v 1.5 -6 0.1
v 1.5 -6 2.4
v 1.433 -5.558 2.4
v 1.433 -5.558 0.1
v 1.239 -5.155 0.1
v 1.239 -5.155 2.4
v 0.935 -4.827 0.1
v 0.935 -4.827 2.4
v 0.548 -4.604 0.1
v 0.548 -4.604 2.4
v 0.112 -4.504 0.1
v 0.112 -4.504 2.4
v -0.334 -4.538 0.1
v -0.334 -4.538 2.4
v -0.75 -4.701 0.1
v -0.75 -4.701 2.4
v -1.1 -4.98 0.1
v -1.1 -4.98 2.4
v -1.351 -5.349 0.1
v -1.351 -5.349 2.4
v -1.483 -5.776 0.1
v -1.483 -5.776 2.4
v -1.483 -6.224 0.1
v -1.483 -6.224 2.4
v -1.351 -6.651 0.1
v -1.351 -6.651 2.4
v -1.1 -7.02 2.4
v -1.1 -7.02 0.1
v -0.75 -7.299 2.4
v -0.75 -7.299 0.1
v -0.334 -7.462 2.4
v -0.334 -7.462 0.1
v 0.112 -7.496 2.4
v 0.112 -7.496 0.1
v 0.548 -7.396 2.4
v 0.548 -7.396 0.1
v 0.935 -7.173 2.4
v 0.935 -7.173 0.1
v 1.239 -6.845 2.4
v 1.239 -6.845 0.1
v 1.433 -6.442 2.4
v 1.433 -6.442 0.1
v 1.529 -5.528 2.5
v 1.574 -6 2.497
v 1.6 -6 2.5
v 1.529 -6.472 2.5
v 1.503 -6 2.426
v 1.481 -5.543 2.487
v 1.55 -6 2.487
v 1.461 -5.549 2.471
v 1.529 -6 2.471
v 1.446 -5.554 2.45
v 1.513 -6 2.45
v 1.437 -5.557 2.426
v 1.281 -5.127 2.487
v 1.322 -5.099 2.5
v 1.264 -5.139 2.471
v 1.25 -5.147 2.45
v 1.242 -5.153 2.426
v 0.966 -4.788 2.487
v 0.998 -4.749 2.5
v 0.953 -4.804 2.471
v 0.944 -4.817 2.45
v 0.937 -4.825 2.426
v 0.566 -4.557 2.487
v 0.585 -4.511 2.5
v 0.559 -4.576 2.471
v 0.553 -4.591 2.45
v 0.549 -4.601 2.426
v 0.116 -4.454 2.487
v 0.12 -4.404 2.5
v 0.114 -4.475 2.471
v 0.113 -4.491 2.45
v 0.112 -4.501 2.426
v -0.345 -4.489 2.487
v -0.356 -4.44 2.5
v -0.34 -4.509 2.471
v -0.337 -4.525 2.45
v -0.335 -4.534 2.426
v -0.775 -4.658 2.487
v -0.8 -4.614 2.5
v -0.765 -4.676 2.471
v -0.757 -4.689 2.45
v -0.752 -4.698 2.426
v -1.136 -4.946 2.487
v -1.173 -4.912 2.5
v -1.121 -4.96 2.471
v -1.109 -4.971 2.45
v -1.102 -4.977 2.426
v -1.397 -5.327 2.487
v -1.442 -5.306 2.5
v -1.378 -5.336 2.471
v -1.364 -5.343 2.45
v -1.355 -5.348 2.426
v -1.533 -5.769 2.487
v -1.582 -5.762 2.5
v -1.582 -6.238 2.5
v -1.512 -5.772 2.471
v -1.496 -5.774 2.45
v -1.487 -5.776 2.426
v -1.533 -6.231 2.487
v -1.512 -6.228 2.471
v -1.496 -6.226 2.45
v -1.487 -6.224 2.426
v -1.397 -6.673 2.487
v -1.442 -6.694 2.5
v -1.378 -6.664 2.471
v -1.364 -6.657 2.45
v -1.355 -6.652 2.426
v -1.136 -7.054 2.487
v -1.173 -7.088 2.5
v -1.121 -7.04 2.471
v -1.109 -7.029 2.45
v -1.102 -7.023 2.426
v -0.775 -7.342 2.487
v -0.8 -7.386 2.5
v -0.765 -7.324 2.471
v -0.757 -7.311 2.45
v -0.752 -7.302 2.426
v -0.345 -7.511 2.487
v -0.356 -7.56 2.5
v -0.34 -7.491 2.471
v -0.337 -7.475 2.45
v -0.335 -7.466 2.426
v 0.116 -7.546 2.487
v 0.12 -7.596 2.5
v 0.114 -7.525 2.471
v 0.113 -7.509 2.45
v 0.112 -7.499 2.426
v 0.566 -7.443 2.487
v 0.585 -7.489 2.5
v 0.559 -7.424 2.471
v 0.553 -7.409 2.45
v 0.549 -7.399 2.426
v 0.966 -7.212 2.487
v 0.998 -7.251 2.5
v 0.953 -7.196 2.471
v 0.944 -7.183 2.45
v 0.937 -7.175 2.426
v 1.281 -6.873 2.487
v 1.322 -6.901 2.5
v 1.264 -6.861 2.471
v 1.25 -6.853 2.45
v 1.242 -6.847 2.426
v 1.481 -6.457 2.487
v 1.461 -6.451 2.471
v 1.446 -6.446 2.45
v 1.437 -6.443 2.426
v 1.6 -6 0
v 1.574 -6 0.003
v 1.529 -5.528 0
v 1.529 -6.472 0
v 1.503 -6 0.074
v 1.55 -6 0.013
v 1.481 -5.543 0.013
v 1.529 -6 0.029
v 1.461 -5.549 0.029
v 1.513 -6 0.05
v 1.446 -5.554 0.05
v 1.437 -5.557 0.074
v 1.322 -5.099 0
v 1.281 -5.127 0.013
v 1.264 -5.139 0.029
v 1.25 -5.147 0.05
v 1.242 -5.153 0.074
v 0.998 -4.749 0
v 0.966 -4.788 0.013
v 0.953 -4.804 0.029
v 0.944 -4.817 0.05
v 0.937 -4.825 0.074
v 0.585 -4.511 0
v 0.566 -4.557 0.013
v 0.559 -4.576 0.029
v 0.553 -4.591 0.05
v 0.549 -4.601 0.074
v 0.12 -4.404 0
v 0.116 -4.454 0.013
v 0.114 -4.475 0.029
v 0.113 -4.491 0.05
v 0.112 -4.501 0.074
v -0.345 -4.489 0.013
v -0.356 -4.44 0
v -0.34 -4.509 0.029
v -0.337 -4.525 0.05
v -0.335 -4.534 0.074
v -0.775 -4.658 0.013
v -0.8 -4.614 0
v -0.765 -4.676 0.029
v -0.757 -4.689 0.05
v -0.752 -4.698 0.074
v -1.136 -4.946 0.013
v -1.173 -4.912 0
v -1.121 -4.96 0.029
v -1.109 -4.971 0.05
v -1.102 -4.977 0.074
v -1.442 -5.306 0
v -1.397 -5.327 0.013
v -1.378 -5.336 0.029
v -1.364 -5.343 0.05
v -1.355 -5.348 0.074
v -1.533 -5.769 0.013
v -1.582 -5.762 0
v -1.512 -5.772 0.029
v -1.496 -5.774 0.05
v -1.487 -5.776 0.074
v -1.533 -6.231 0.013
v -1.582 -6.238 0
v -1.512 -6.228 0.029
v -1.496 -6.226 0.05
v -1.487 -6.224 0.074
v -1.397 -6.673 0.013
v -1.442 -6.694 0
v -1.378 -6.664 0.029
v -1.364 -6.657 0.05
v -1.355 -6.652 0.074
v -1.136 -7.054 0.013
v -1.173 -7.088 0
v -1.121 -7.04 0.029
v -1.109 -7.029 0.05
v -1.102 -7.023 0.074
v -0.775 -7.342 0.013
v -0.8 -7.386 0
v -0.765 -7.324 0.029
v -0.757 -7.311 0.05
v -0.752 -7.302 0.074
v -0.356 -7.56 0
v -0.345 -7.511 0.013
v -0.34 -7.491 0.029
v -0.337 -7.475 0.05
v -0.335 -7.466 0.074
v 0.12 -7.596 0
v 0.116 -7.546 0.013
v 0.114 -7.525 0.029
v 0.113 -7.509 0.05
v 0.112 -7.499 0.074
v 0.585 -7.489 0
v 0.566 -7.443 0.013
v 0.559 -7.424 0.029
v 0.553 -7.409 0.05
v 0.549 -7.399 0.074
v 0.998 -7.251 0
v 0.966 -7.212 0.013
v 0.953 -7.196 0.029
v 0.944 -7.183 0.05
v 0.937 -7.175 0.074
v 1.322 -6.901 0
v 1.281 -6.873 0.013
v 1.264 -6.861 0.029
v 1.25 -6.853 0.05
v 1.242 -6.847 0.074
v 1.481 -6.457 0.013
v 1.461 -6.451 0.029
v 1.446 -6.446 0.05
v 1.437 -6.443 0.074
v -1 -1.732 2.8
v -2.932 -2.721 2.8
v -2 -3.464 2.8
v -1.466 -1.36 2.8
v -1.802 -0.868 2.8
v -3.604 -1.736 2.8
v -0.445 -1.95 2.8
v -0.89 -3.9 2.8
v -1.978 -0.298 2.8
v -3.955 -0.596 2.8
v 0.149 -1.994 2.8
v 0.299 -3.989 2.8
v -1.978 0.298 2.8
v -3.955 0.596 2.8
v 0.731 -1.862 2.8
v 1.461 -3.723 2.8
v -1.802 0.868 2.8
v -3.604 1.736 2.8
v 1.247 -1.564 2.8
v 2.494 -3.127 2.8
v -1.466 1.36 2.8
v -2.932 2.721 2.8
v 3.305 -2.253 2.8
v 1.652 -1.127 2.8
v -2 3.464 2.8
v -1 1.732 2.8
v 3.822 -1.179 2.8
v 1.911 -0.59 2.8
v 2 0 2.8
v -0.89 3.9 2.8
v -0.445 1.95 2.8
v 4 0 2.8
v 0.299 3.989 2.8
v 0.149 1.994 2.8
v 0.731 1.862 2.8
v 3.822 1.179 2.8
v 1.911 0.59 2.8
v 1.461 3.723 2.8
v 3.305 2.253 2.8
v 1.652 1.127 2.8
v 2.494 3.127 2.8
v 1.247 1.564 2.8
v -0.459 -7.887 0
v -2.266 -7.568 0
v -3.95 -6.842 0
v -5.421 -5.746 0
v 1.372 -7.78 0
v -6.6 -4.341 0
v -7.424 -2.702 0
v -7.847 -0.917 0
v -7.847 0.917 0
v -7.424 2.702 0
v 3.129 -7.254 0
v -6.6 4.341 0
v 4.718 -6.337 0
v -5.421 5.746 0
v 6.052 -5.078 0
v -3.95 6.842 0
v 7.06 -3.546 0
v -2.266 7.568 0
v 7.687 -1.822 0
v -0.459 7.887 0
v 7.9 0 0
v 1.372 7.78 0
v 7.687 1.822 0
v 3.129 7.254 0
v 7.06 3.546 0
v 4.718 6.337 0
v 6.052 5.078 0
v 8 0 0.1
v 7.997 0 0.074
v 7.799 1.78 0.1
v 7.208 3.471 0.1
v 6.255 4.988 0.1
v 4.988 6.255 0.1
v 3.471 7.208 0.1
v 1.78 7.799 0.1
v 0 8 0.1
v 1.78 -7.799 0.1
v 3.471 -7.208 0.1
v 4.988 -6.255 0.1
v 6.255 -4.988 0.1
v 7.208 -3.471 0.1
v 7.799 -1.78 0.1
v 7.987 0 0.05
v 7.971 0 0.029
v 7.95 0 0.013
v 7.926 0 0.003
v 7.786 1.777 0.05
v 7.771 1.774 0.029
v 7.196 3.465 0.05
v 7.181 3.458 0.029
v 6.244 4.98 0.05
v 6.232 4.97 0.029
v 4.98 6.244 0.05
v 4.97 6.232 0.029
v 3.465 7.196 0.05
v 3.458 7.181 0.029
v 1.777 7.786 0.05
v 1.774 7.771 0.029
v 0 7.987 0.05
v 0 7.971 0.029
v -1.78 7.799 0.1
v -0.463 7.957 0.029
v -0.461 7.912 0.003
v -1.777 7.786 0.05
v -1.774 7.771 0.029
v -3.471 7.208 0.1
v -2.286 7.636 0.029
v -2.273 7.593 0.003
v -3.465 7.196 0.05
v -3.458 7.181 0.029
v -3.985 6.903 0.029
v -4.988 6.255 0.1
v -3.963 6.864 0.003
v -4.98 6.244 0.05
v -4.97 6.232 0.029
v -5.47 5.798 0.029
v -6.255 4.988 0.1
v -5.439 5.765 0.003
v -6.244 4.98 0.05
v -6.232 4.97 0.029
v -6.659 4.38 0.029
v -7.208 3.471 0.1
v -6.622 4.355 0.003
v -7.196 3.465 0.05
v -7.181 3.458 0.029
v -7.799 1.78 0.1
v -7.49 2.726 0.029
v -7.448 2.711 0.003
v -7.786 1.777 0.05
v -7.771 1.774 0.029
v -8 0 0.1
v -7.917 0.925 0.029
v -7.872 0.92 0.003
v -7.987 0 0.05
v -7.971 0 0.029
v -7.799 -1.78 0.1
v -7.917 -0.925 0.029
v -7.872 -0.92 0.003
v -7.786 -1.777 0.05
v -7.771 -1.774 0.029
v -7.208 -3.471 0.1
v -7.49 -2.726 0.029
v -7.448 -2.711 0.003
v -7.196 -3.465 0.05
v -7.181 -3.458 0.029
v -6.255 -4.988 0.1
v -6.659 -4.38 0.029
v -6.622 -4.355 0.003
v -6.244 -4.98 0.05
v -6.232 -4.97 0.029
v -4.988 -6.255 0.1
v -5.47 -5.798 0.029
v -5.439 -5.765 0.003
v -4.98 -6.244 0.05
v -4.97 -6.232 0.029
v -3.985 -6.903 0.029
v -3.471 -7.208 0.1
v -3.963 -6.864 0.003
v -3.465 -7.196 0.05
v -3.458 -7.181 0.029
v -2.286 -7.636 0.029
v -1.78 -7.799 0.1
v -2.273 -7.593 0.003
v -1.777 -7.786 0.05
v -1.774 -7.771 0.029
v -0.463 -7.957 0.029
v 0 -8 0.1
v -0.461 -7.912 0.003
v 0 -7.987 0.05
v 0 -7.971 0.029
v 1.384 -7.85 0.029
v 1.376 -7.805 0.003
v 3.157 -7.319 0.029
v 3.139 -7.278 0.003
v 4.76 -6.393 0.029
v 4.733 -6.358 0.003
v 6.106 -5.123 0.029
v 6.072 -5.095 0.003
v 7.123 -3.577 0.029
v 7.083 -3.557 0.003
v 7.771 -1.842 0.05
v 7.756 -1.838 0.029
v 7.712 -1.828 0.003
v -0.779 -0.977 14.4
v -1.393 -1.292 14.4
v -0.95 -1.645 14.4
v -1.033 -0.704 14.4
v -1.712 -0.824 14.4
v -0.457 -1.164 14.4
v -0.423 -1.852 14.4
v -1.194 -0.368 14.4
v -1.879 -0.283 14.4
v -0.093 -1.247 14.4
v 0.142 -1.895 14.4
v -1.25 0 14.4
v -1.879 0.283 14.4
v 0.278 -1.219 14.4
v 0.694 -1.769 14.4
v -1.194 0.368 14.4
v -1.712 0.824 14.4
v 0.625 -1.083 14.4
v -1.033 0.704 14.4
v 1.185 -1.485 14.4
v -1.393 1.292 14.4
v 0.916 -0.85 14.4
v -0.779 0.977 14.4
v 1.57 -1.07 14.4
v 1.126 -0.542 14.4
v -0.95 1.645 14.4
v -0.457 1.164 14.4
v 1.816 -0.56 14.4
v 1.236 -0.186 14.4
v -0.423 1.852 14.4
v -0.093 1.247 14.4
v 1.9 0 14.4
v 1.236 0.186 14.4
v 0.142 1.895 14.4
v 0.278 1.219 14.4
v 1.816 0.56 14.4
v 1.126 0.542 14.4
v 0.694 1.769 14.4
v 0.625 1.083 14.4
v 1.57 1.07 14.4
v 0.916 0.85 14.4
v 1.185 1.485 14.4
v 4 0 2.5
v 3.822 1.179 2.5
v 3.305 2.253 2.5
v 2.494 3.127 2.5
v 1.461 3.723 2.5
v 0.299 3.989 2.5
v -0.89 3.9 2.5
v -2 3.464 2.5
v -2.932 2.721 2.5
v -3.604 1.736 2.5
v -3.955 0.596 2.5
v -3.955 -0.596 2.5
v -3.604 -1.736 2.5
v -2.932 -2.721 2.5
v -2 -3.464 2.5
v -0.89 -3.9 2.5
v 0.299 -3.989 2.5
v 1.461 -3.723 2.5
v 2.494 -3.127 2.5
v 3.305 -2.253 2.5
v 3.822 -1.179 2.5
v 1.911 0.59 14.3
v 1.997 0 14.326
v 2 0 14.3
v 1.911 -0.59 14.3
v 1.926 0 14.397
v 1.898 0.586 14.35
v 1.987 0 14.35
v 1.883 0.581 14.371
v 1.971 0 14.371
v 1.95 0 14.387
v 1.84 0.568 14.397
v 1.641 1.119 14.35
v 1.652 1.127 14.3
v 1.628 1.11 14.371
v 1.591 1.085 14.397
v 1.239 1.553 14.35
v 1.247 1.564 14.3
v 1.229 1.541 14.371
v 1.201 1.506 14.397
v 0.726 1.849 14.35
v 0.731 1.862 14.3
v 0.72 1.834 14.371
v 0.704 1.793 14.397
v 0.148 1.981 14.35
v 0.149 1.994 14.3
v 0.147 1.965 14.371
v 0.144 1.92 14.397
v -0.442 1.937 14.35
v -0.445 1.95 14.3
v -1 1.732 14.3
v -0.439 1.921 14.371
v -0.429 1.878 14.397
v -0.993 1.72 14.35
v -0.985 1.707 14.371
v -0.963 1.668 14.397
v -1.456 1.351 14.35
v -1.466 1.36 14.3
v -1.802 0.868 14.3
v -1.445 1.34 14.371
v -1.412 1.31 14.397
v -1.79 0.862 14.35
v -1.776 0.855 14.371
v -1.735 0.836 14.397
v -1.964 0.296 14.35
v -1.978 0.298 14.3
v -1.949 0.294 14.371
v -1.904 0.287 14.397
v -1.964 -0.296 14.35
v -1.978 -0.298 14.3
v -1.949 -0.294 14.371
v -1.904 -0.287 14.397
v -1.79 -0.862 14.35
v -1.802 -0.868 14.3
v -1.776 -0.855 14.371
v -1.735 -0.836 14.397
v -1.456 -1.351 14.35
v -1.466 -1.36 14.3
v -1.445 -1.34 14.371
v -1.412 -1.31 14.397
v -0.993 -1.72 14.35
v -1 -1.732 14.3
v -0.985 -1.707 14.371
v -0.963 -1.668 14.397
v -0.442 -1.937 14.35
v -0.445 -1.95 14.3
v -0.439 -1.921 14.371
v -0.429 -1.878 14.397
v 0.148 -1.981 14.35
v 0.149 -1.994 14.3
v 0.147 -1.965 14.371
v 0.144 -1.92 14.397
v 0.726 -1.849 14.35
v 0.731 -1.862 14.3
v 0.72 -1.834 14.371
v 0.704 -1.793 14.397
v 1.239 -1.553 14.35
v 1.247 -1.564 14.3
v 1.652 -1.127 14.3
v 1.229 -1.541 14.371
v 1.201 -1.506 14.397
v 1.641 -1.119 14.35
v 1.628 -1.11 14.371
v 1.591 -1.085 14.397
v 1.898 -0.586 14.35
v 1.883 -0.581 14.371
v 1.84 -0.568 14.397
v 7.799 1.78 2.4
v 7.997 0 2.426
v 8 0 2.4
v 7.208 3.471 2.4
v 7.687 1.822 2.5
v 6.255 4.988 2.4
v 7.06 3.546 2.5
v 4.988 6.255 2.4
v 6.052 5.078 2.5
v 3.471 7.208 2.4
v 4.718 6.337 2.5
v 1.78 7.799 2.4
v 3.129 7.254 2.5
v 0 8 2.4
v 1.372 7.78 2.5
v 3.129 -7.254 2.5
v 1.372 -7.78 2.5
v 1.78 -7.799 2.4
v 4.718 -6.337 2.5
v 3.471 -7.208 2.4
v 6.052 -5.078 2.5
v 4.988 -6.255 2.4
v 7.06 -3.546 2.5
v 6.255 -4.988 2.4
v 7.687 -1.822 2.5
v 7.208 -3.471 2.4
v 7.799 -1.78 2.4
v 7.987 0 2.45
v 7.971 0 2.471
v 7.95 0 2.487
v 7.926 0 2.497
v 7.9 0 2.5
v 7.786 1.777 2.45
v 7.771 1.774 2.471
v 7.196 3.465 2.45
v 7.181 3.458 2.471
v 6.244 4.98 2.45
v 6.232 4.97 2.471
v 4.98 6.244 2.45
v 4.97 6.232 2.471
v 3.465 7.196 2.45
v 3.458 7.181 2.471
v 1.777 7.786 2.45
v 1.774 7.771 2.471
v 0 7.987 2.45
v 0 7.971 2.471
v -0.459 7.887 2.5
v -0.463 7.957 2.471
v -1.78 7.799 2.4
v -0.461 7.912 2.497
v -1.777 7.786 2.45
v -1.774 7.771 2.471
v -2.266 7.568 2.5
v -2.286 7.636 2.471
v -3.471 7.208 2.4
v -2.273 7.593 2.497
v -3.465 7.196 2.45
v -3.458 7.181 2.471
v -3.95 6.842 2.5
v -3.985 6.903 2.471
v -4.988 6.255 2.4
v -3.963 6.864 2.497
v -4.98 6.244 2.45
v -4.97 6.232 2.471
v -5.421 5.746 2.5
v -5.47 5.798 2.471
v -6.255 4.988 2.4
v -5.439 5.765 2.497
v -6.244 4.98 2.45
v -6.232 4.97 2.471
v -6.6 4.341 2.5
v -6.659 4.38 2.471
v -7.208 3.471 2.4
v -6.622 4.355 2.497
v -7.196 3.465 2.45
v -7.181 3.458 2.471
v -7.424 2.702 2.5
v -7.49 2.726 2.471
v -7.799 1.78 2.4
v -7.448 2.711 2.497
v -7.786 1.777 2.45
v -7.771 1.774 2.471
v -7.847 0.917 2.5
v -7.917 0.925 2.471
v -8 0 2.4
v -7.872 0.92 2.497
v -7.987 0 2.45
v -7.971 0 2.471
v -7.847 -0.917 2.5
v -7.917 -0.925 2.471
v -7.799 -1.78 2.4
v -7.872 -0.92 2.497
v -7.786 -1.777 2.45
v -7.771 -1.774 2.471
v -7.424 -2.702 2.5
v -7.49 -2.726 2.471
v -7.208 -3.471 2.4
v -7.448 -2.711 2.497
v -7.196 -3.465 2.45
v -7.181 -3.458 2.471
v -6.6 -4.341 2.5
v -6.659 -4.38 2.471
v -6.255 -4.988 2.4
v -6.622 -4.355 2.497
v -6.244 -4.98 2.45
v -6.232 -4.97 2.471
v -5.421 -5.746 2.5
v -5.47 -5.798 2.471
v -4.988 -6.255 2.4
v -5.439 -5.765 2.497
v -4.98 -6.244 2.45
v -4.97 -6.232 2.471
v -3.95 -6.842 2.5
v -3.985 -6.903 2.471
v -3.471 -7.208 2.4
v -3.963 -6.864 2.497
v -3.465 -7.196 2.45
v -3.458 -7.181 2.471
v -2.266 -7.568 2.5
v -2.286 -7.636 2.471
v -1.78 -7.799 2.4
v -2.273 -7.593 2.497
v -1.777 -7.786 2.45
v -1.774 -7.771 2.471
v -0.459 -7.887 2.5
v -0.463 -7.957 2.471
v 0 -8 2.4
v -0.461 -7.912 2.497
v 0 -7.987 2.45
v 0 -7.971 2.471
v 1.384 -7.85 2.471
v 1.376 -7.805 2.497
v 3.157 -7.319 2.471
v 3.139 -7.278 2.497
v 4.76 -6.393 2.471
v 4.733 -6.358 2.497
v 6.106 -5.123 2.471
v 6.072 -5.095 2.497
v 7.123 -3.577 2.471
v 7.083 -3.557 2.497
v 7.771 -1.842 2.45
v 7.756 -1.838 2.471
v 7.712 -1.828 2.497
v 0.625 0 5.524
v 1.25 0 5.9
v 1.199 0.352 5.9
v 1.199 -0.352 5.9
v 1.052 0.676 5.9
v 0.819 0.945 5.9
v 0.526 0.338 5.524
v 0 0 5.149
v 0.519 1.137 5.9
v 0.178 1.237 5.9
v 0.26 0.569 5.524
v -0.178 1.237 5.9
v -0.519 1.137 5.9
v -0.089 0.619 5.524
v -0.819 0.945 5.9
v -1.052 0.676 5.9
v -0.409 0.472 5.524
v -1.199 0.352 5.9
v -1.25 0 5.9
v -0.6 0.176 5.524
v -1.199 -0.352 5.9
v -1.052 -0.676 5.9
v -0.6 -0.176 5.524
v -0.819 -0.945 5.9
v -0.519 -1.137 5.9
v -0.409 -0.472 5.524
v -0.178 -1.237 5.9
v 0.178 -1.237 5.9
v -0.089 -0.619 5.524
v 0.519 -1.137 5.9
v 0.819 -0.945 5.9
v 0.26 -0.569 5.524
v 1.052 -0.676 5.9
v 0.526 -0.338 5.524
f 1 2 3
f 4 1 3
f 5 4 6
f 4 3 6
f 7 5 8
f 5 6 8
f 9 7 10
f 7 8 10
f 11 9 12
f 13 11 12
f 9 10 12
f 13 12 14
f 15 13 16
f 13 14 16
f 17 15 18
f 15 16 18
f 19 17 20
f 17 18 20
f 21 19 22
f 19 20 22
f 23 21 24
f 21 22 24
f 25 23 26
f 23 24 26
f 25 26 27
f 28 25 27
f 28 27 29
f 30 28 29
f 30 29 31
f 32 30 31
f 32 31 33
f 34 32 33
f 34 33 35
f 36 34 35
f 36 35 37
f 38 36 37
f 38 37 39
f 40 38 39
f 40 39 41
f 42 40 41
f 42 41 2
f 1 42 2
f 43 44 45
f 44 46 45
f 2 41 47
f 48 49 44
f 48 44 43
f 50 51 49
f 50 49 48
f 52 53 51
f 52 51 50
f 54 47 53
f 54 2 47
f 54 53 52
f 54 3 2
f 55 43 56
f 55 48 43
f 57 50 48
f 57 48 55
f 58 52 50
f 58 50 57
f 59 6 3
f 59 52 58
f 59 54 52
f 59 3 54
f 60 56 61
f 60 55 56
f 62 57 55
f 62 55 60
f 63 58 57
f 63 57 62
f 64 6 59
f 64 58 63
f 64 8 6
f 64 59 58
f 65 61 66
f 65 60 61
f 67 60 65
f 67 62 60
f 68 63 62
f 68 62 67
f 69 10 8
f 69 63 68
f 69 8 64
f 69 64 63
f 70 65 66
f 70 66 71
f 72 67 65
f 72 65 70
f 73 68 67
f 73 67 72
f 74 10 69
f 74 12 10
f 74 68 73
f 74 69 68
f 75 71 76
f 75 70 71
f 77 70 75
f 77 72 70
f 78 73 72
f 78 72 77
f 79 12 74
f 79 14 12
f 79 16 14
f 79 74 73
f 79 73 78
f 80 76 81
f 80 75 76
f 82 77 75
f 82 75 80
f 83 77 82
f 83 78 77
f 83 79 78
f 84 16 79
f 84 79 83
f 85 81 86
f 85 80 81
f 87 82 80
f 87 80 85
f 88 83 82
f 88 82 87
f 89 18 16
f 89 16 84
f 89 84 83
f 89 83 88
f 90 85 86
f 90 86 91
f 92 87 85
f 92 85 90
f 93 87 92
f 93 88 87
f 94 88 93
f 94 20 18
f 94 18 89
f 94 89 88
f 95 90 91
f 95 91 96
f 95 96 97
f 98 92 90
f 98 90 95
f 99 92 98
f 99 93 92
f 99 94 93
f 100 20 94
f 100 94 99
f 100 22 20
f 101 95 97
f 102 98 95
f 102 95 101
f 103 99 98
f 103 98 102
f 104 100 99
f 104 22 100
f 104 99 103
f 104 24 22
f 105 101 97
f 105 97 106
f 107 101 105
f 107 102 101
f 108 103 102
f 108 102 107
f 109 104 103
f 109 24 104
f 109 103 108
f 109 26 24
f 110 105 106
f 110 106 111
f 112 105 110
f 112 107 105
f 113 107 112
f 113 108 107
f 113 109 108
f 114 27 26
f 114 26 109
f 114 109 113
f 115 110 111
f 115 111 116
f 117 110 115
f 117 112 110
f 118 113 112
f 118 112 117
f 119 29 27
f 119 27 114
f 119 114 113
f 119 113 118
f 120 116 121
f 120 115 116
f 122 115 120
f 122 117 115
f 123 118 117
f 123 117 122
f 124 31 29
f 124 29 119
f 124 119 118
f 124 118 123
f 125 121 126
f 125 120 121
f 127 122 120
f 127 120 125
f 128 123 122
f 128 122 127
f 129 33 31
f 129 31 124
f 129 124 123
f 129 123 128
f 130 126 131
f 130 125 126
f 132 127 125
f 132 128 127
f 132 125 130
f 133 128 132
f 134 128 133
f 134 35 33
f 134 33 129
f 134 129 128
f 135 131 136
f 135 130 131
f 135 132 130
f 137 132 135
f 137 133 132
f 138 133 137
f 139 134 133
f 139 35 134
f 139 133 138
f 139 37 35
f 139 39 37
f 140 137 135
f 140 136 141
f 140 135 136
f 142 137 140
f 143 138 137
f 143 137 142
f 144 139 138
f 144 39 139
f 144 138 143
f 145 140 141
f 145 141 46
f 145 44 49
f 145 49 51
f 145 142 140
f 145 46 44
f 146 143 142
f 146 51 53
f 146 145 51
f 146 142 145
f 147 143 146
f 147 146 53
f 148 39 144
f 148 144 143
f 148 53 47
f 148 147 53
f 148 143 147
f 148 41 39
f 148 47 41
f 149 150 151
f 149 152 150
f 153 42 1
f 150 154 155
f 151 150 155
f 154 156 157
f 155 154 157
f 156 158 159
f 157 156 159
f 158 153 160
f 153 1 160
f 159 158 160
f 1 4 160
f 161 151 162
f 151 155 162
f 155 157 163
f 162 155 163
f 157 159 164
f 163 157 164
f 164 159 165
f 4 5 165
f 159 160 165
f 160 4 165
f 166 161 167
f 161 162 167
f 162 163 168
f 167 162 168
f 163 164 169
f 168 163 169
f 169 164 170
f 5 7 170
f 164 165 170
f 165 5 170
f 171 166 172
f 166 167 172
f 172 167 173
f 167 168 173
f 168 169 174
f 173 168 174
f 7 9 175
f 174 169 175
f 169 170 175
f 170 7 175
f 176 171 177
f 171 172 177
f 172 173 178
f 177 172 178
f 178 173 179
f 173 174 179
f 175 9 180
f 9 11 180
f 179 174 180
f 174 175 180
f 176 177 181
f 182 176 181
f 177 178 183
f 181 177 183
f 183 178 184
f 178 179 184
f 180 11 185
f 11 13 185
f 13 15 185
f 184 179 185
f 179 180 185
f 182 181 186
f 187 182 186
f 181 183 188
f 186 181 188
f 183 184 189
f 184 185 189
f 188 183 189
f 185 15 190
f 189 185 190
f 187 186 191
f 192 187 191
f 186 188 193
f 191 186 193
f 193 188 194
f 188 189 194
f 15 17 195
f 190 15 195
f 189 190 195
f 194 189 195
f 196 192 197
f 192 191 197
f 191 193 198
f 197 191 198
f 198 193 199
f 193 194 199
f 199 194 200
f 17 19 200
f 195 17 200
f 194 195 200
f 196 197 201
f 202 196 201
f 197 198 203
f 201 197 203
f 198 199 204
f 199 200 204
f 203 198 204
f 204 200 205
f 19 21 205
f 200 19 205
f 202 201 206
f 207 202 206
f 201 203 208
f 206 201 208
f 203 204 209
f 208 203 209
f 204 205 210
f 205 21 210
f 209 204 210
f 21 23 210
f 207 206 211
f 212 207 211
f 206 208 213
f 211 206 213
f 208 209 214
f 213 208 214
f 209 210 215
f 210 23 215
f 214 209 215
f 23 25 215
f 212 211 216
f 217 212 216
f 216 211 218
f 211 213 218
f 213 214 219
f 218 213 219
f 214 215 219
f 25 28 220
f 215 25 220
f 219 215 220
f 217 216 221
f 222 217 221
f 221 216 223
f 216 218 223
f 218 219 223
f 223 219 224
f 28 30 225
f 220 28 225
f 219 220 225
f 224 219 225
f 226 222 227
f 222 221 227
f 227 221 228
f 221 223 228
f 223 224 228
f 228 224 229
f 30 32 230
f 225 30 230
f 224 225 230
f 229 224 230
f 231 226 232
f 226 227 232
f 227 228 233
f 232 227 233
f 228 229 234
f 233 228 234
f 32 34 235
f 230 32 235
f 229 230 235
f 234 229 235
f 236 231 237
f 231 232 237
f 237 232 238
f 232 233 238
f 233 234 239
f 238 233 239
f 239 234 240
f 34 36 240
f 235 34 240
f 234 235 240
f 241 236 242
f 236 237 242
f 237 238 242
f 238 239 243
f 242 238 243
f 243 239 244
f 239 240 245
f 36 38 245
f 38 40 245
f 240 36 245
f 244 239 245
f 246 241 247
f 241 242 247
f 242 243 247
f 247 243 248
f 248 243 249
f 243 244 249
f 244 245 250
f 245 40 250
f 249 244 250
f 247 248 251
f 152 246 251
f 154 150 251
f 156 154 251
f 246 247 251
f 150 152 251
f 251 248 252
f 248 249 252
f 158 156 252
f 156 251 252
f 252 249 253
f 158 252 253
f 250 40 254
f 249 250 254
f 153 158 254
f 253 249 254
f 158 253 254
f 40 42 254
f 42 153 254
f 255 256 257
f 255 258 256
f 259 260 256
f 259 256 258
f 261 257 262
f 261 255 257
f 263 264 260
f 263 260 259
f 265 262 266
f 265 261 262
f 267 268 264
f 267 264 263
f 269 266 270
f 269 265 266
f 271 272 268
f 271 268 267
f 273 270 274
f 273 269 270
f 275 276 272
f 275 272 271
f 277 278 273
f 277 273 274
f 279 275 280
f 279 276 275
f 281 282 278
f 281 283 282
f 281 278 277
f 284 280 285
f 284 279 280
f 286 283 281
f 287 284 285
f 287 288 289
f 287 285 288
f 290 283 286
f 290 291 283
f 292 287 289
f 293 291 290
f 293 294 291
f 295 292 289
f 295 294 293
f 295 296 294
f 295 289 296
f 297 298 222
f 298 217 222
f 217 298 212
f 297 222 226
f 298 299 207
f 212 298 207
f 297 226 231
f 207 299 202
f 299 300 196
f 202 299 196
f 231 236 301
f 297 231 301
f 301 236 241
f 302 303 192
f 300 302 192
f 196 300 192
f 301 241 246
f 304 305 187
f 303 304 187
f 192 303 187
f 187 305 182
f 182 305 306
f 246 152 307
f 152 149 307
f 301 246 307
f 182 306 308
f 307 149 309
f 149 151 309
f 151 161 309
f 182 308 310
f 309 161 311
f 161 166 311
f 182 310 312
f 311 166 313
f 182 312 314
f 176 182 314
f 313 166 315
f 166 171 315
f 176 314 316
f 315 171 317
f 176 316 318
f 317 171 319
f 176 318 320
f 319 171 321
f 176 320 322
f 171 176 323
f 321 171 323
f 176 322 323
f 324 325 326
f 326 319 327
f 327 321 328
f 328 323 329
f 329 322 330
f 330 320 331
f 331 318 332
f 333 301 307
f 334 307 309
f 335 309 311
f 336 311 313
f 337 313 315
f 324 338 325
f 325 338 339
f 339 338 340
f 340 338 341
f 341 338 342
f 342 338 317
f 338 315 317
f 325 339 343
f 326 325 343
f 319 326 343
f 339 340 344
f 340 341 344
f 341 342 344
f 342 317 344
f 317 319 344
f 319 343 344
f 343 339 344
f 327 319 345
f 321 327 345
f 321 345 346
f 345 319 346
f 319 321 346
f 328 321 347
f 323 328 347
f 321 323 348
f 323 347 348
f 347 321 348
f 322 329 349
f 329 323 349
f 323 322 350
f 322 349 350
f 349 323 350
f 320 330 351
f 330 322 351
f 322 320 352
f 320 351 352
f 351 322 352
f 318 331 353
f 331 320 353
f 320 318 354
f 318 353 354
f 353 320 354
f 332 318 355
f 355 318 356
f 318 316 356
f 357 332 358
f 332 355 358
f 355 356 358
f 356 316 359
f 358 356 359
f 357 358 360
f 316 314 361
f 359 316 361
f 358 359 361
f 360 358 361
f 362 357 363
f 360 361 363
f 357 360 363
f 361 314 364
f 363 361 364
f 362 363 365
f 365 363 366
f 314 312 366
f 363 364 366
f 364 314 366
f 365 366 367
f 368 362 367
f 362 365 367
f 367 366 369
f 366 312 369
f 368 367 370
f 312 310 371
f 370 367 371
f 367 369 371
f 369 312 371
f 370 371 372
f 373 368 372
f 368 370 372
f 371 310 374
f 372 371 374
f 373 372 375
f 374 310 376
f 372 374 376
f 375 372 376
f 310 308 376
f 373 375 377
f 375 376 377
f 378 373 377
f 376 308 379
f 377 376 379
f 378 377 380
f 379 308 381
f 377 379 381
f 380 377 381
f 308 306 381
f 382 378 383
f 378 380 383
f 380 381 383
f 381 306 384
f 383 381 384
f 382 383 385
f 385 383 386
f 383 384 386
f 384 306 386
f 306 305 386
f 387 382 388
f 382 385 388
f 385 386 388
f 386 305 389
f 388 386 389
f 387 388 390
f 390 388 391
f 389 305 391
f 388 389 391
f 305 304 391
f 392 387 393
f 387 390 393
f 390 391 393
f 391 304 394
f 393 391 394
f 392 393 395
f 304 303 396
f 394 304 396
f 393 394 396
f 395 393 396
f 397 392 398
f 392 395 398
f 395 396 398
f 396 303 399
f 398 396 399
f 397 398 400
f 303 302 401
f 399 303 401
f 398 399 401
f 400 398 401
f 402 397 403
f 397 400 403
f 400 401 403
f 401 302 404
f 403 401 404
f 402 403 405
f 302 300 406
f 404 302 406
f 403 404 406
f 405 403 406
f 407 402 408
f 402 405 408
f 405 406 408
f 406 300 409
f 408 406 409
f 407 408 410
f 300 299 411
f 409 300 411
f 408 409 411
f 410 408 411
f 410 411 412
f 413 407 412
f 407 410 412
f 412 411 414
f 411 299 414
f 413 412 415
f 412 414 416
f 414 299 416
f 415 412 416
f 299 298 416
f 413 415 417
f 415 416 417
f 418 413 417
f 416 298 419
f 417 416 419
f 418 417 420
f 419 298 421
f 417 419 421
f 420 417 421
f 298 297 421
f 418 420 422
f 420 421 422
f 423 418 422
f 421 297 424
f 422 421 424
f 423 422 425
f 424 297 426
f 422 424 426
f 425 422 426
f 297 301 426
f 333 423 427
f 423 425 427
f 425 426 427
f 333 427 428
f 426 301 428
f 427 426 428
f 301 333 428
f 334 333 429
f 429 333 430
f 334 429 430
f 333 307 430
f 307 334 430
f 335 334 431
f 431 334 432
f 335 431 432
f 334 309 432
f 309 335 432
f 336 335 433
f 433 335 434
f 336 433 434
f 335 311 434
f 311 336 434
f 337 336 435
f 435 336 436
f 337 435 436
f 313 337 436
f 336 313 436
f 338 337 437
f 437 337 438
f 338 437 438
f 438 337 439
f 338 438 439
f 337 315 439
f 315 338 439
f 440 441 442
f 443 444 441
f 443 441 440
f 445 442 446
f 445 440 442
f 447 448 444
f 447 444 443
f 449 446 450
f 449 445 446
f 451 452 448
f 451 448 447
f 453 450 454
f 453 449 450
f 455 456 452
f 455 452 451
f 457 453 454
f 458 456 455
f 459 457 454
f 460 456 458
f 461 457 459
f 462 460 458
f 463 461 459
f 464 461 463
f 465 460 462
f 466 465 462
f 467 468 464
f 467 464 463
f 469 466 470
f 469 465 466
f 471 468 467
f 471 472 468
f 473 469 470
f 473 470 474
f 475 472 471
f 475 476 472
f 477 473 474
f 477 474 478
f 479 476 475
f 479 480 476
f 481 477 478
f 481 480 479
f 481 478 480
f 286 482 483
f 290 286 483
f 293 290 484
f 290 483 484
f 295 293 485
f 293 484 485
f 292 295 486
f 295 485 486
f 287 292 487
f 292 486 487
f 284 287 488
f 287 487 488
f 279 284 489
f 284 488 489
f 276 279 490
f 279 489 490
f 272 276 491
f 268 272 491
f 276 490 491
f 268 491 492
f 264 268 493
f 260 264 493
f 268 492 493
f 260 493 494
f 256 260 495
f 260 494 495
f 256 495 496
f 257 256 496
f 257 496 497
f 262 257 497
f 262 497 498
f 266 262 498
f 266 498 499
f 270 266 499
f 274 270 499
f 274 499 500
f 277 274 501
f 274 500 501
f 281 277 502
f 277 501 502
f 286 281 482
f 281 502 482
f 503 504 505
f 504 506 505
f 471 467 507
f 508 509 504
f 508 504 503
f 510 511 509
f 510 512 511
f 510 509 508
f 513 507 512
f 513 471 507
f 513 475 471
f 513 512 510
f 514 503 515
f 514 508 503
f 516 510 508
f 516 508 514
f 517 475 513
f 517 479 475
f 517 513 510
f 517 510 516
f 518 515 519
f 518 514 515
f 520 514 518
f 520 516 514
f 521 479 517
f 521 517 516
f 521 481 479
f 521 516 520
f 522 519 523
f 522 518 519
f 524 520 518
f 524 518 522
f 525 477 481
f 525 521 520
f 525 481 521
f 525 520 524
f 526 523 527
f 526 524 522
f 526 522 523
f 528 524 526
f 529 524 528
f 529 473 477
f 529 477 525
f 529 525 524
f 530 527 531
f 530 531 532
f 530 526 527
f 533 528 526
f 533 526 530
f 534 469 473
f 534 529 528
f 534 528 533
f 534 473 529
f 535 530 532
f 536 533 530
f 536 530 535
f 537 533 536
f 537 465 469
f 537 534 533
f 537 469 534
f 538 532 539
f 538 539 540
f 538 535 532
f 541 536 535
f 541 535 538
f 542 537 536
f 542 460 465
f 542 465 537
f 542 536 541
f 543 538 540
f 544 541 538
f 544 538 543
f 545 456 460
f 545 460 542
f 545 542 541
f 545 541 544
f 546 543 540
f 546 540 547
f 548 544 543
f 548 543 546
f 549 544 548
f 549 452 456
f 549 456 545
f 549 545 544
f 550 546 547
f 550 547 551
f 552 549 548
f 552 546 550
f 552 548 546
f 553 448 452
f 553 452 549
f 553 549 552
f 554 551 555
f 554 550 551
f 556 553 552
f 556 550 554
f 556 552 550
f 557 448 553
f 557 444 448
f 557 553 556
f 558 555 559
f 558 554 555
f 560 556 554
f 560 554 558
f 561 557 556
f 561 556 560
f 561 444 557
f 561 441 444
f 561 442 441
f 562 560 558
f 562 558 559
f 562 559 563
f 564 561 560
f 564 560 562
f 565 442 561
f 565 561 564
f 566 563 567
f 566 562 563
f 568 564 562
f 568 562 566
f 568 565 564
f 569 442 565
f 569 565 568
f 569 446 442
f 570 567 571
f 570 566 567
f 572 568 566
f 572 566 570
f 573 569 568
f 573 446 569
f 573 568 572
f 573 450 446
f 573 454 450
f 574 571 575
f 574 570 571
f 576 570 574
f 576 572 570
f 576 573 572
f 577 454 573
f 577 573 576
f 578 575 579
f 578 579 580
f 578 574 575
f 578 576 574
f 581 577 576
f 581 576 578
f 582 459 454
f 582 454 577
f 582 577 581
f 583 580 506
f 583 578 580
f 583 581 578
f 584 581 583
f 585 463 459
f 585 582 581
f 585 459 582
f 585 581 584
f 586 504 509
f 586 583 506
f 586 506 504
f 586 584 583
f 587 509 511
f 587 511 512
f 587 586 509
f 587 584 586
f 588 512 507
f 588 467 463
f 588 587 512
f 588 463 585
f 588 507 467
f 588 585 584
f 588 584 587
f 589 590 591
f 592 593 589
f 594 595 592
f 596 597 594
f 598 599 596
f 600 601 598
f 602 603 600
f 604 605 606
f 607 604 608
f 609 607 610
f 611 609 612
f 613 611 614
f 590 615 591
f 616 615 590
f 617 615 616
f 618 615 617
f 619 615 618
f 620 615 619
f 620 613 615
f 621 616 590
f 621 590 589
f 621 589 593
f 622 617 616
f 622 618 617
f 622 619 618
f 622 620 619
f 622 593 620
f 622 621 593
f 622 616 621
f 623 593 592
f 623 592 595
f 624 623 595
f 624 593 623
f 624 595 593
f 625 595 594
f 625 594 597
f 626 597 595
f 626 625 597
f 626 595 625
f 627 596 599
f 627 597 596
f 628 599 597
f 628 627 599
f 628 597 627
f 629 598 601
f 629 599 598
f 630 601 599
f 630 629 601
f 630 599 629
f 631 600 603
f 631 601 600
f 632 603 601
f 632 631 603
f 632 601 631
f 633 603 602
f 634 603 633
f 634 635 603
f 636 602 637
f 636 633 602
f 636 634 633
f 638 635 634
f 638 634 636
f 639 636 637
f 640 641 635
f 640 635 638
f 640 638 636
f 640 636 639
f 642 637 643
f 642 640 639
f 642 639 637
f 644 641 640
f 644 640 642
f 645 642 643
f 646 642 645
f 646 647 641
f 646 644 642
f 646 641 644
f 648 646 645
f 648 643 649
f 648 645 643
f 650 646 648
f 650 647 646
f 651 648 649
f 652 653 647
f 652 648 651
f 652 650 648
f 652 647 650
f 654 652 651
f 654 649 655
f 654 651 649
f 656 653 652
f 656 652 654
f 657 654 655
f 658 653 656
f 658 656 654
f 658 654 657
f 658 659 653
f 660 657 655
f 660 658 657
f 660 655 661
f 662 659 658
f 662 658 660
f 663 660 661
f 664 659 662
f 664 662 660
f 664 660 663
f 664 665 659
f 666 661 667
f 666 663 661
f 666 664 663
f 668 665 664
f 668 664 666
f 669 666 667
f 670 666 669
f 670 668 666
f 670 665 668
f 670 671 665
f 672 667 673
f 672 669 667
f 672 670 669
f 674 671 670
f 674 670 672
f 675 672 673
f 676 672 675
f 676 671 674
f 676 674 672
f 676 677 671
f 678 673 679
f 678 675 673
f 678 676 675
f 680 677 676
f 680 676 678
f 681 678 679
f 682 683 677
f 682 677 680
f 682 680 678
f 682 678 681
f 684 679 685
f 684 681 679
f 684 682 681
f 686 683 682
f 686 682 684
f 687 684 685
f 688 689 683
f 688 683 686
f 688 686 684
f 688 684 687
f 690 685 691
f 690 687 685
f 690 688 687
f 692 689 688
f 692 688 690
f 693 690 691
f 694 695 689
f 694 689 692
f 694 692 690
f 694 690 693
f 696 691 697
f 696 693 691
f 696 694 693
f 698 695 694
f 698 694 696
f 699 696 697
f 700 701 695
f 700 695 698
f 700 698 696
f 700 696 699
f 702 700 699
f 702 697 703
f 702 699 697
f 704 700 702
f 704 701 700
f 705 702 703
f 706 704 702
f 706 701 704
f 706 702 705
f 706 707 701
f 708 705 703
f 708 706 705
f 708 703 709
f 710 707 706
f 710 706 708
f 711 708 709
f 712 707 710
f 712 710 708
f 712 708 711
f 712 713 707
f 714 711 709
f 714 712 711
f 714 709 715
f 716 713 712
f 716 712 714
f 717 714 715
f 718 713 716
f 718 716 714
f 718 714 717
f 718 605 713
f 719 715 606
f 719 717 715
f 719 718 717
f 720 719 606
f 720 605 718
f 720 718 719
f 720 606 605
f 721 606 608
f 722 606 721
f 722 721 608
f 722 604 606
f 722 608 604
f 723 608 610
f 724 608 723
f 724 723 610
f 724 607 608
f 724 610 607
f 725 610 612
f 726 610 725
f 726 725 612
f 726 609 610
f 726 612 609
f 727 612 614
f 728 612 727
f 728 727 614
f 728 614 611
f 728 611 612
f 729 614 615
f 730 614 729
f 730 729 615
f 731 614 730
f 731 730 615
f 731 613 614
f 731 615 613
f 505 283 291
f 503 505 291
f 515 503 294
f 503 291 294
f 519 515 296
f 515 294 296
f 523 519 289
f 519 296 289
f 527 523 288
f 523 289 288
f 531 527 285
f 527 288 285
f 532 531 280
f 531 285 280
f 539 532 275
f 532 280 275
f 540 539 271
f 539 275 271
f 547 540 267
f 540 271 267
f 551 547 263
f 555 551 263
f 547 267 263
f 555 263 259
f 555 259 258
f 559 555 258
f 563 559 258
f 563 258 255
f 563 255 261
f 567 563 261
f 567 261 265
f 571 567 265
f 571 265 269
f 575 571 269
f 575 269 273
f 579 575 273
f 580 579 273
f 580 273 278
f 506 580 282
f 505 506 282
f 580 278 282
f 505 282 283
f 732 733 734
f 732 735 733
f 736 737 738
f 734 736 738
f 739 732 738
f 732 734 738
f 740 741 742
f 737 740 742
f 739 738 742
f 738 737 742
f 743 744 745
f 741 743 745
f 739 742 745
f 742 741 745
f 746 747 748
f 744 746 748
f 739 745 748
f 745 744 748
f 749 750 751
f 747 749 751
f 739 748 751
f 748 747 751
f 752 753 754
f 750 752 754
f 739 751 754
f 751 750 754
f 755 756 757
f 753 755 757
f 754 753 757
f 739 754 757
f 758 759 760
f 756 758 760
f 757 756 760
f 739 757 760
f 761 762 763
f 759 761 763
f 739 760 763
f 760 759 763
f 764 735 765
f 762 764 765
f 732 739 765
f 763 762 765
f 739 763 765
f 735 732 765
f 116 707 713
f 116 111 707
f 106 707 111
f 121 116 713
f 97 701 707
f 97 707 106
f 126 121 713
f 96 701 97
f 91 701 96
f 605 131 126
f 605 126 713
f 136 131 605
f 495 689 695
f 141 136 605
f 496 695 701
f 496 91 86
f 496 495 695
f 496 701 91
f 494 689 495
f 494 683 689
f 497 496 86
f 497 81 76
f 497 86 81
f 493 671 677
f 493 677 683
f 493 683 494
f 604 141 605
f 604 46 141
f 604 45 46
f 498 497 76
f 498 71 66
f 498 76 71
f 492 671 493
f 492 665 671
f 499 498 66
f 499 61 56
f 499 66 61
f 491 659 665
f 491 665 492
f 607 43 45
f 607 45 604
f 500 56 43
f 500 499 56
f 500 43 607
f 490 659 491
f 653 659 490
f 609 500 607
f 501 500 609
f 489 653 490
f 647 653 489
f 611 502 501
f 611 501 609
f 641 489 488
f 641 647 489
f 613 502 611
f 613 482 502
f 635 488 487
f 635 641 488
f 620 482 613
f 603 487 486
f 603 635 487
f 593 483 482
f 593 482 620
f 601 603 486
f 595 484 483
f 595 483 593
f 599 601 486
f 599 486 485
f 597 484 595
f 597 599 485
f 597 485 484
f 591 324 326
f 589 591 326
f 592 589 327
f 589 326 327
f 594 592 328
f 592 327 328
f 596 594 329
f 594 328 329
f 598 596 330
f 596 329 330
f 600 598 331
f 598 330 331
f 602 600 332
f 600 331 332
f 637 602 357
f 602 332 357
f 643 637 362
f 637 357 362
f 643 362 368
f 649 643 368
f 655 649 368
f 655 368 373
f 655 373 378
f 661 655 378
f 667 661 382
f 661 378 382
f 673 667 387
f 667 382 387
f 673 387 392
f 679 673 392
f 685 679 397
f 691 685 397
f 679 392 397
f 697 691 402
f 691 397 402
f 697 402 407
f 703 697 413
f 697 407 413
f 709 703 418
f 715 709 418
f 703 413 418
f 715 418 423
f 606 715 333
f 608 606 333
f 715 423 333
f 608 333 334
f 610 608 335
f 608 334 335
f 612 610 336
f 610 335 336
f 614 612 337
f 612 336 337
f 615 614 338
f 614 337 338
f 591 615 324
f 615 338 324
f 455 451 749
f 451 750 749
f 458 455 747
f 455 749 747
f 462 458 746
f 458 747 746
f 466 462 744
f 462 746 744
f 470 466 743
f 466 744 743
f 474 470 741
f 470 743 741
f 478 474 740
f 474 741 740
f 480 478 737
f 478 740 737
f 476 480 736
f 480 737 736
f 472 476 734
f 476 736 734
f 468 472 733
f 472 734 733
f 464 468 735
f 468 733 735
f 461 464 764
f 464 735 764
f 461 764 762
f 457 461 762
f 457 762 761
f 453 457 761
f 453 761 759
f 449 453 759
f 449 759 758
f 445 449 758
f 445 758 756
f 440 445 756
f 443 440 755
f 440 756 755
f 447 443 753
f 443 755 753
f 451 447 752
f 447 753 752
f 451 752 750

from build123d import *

# Parameters (mm, degrees)
SKETCH1_R                 = 8
BOSS_EXTRUDE1_DEPTH       = 2.5
SKETCH3_R                 = 4
BOSS_EXTRUDE2_DEPTH       = 0.3
SKETCH4_R                 = 2
BOSS_EXTRUDE3_DEPTH       = 11.6
M3X0_5_TAPPED_HOLE1_D     = 2.5
M3X0_5_TAPPED_HOLE1_DEPTH = 8.5
M3X0_5_TAPPED_HOLE1_TIP   = 0.751075774
SKETCH7_R                 = 1.5
CUT_EXTRUDE1_DEPTH        = 12.9
CUT_EXTRUDE1_DEPTH_BACK   = 3.5
FILLET1_R                 = 0.1


with BuildPart() as part:
    # Sketch1 → Boss-Extrude1 (new body)
    with BuildSketch(Plane.XY):
        Circle(SKETCH1_R)
    extrude(amount=BOSS_EXTRUDE1_DEPTH)

    # Sketch3 → Boss-Extrude2 (add)
    with BuildSketch(Plane.XY.offset(2.5)):
        Circle(SKETCH3_R)
    extrude(amount=BOSS_EXTRUDE2_DEPTH)

    # Sketch4 → Boss-Extrude3 (add)
    with BuildSketch(Plane.XY.offset(2.8)):
        Circle(SKETCH4_R)
    extrude(amount=BOSS_EXTRUDE3_DEPTH)

    # M3x0.5 Tapped Hole1
    with Locations(Plane.XY.offset(14.4)):
        with Locations((0, 0)):
            Hole(M3X0_5_TAPPED_HOLE1_D / 2, depth=M3X0_5_TAPPED_HOLE1_DEPTH)
            with Locations((0, 0, -(M3X0_5_TAPPED_HOLE1_DEPTH + M3X0_5_TAPPED_HOLE1_TIP / 2))):  # 118° drill point
                Cone(0, M3X0_5_TAPPED_HOLE1_D / 2, M3X0_5_TAPPED_HOLE1_TIP, mode=Mode.SUBTRACT)

    # Sketch7 → Cut-Extrude1 (cut, two sides)
    with BuildSketch(Plane.XY.offset(2.5)) as cut_extrude1_sk:
        with Locations((0, -6)):
            Circle(SKETCH7_R)
    extrude(amount=CUT_EXTRUDE1_DEPTH, mode=Mode.SUBTRACT)
    extrude(cut_extrude1_sk.sketch, amount=-CUT_EXTRUDE1_DEPTH_BACK, mode=Mode.SUBTRACT)

    # Fillet1
    fillet1_edges = [part.edges().sort_by_distance(p)[0] for p in [
        (-2, 0, 14.4),
        (-8, 0, 0),
        (-1.5, -6, 2.5),
        (-1.5, -6, 0),
        (-8, 0, 2.5),
    ]]
    fillet(fillet1_edges, radius=FILLET1_R)


solid = part.part
